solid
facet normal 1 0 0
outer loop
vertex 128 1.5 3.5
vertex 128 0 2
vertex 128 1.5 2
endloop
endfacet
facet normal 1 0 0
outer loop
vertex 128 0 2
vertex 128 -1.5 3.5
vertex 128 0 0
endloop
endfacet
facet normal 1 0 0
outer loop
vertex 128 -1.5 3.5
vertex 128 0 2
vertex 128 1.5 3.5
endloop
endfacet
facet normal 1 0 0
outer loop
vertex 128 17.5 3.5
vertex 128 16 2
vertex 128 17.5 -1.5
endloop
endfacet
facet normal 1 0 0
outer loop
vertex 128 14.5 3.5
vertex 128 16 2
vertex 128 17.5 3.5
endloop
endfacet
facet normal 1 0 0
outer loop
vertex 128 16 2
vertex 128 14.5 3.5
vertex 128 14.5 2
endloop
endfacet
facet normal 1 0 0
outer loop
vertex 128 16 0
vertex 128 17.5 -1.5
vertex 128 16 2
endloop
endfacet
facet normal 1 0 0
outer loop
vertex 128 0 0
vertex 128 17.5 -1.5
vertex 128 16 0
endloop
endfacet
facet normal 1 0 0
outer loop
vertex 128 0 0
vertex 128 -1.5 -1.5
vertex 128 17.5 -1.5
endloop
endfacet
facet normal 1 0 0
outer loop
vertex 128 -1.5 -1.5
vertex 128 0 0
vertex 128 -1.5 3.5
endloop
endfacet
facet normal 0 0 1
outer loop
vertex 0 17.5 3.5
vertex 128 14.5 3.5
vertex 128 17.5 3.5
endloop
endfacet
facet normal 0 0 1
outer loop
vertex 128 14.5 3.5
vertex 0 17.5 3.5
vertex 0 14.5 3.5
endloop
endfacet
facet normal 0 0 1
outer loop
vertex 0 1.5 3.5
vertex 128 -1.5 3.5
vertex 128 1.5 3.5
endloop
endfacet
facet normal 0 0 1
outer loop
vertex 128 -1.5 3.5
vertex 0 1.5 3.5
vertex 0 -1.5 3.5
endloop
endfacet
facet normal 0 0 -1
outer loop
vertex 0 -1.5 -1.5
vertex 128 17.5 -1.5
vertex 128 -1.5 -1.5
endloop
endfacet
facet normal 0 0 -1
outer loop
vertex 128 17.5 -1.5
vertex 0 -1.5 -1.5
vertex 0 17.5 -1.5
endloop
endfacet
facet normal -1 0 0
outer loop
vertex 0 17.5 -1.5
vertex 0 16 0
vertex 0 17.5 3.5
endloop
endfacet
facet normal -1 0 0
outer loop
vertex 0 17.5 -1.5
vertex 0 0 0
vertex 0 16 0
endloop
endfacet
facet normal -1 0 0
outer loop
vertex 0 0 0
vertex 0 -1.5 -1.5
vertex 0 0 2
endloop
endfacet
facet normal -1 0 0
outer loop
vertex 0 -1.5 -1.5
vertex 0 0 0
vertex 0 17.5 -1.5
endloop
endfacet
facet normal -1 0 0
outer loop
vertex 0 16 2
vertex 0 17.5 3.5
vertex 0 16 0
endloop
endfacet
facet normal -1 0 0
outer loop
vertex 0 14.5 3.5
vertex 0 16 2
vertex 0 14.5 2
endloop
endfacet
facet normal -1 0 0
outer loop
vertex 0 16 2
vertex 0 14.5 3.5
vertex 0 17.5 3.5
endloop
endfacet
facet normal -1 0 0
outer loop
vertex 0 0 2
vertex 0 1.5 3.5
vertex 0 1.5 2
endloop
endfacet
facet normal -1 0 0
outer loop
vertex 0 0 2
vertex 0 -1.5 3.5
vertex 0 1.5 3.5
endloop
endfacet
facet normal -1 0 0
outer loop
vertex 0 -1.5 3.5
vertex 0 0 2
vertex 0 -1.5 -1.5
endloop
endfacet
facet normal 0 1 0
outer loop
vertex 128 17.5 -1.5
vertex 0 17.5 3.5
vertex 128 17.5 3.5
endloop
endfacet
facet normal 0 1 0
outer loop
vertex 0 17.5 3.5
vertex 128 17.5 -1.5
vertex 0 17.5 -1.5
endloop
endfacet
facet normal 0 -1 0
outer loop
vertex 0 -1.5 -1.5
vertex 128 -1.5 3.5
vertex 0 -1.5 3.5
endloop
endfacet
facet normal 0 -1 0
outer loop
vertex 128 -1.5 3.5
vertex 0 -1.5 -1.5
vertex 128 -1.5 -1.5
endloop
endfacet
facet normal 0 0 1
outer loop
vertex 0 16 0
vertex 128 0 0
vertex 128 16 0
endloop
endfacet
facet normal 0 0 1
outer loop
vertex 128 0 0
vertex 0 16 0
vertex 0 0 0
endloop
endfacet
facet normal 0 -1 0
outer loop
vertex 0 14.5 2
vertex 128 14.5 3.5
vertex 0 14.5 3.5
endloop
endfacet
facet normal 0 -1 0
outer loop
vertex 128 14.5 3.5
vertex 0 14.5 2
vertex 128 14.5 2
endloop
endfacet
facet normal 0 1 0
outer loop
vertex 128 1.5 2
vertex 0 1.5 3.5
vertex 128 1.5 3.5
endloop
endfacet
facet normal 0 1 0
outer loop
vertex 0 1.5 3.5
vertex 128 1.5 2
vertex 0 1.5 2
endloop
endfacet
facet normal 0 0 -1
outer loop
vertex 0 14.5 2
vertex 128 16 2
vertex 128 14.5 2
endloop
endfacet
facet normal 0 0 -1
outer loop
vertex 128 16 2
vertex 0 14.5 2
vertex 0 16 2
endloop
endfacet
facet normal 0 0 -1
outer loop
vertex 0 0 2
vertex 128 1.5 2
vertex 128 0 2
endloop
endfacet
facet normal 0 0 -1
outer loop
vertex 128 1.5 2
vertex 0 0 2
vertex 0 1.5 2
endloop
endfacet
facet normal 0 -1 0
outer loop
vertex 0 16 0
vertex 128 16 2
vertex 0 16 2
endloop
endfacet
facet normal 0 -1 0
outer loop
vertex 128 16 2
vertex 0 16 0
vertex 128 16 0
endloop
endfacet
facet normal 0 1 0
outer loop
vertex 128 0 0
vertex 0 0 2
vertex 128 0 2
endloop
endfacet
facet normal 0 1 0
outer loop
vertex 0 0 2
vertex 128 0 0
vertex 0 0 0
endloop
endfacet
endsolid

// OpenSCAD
nameplate = [
  128,
  16,
  2,
];

difference() {
  translate([0, -1.5, -1.5]) cube([nameplate.x, nameplate.y + 3, nameplate.z + 3]);
  translate([0, 1.5, 0]) cube([nameplate.x, nameplate.y - 3, nameplate.z + 2]);
  cube(nameplate);
}
